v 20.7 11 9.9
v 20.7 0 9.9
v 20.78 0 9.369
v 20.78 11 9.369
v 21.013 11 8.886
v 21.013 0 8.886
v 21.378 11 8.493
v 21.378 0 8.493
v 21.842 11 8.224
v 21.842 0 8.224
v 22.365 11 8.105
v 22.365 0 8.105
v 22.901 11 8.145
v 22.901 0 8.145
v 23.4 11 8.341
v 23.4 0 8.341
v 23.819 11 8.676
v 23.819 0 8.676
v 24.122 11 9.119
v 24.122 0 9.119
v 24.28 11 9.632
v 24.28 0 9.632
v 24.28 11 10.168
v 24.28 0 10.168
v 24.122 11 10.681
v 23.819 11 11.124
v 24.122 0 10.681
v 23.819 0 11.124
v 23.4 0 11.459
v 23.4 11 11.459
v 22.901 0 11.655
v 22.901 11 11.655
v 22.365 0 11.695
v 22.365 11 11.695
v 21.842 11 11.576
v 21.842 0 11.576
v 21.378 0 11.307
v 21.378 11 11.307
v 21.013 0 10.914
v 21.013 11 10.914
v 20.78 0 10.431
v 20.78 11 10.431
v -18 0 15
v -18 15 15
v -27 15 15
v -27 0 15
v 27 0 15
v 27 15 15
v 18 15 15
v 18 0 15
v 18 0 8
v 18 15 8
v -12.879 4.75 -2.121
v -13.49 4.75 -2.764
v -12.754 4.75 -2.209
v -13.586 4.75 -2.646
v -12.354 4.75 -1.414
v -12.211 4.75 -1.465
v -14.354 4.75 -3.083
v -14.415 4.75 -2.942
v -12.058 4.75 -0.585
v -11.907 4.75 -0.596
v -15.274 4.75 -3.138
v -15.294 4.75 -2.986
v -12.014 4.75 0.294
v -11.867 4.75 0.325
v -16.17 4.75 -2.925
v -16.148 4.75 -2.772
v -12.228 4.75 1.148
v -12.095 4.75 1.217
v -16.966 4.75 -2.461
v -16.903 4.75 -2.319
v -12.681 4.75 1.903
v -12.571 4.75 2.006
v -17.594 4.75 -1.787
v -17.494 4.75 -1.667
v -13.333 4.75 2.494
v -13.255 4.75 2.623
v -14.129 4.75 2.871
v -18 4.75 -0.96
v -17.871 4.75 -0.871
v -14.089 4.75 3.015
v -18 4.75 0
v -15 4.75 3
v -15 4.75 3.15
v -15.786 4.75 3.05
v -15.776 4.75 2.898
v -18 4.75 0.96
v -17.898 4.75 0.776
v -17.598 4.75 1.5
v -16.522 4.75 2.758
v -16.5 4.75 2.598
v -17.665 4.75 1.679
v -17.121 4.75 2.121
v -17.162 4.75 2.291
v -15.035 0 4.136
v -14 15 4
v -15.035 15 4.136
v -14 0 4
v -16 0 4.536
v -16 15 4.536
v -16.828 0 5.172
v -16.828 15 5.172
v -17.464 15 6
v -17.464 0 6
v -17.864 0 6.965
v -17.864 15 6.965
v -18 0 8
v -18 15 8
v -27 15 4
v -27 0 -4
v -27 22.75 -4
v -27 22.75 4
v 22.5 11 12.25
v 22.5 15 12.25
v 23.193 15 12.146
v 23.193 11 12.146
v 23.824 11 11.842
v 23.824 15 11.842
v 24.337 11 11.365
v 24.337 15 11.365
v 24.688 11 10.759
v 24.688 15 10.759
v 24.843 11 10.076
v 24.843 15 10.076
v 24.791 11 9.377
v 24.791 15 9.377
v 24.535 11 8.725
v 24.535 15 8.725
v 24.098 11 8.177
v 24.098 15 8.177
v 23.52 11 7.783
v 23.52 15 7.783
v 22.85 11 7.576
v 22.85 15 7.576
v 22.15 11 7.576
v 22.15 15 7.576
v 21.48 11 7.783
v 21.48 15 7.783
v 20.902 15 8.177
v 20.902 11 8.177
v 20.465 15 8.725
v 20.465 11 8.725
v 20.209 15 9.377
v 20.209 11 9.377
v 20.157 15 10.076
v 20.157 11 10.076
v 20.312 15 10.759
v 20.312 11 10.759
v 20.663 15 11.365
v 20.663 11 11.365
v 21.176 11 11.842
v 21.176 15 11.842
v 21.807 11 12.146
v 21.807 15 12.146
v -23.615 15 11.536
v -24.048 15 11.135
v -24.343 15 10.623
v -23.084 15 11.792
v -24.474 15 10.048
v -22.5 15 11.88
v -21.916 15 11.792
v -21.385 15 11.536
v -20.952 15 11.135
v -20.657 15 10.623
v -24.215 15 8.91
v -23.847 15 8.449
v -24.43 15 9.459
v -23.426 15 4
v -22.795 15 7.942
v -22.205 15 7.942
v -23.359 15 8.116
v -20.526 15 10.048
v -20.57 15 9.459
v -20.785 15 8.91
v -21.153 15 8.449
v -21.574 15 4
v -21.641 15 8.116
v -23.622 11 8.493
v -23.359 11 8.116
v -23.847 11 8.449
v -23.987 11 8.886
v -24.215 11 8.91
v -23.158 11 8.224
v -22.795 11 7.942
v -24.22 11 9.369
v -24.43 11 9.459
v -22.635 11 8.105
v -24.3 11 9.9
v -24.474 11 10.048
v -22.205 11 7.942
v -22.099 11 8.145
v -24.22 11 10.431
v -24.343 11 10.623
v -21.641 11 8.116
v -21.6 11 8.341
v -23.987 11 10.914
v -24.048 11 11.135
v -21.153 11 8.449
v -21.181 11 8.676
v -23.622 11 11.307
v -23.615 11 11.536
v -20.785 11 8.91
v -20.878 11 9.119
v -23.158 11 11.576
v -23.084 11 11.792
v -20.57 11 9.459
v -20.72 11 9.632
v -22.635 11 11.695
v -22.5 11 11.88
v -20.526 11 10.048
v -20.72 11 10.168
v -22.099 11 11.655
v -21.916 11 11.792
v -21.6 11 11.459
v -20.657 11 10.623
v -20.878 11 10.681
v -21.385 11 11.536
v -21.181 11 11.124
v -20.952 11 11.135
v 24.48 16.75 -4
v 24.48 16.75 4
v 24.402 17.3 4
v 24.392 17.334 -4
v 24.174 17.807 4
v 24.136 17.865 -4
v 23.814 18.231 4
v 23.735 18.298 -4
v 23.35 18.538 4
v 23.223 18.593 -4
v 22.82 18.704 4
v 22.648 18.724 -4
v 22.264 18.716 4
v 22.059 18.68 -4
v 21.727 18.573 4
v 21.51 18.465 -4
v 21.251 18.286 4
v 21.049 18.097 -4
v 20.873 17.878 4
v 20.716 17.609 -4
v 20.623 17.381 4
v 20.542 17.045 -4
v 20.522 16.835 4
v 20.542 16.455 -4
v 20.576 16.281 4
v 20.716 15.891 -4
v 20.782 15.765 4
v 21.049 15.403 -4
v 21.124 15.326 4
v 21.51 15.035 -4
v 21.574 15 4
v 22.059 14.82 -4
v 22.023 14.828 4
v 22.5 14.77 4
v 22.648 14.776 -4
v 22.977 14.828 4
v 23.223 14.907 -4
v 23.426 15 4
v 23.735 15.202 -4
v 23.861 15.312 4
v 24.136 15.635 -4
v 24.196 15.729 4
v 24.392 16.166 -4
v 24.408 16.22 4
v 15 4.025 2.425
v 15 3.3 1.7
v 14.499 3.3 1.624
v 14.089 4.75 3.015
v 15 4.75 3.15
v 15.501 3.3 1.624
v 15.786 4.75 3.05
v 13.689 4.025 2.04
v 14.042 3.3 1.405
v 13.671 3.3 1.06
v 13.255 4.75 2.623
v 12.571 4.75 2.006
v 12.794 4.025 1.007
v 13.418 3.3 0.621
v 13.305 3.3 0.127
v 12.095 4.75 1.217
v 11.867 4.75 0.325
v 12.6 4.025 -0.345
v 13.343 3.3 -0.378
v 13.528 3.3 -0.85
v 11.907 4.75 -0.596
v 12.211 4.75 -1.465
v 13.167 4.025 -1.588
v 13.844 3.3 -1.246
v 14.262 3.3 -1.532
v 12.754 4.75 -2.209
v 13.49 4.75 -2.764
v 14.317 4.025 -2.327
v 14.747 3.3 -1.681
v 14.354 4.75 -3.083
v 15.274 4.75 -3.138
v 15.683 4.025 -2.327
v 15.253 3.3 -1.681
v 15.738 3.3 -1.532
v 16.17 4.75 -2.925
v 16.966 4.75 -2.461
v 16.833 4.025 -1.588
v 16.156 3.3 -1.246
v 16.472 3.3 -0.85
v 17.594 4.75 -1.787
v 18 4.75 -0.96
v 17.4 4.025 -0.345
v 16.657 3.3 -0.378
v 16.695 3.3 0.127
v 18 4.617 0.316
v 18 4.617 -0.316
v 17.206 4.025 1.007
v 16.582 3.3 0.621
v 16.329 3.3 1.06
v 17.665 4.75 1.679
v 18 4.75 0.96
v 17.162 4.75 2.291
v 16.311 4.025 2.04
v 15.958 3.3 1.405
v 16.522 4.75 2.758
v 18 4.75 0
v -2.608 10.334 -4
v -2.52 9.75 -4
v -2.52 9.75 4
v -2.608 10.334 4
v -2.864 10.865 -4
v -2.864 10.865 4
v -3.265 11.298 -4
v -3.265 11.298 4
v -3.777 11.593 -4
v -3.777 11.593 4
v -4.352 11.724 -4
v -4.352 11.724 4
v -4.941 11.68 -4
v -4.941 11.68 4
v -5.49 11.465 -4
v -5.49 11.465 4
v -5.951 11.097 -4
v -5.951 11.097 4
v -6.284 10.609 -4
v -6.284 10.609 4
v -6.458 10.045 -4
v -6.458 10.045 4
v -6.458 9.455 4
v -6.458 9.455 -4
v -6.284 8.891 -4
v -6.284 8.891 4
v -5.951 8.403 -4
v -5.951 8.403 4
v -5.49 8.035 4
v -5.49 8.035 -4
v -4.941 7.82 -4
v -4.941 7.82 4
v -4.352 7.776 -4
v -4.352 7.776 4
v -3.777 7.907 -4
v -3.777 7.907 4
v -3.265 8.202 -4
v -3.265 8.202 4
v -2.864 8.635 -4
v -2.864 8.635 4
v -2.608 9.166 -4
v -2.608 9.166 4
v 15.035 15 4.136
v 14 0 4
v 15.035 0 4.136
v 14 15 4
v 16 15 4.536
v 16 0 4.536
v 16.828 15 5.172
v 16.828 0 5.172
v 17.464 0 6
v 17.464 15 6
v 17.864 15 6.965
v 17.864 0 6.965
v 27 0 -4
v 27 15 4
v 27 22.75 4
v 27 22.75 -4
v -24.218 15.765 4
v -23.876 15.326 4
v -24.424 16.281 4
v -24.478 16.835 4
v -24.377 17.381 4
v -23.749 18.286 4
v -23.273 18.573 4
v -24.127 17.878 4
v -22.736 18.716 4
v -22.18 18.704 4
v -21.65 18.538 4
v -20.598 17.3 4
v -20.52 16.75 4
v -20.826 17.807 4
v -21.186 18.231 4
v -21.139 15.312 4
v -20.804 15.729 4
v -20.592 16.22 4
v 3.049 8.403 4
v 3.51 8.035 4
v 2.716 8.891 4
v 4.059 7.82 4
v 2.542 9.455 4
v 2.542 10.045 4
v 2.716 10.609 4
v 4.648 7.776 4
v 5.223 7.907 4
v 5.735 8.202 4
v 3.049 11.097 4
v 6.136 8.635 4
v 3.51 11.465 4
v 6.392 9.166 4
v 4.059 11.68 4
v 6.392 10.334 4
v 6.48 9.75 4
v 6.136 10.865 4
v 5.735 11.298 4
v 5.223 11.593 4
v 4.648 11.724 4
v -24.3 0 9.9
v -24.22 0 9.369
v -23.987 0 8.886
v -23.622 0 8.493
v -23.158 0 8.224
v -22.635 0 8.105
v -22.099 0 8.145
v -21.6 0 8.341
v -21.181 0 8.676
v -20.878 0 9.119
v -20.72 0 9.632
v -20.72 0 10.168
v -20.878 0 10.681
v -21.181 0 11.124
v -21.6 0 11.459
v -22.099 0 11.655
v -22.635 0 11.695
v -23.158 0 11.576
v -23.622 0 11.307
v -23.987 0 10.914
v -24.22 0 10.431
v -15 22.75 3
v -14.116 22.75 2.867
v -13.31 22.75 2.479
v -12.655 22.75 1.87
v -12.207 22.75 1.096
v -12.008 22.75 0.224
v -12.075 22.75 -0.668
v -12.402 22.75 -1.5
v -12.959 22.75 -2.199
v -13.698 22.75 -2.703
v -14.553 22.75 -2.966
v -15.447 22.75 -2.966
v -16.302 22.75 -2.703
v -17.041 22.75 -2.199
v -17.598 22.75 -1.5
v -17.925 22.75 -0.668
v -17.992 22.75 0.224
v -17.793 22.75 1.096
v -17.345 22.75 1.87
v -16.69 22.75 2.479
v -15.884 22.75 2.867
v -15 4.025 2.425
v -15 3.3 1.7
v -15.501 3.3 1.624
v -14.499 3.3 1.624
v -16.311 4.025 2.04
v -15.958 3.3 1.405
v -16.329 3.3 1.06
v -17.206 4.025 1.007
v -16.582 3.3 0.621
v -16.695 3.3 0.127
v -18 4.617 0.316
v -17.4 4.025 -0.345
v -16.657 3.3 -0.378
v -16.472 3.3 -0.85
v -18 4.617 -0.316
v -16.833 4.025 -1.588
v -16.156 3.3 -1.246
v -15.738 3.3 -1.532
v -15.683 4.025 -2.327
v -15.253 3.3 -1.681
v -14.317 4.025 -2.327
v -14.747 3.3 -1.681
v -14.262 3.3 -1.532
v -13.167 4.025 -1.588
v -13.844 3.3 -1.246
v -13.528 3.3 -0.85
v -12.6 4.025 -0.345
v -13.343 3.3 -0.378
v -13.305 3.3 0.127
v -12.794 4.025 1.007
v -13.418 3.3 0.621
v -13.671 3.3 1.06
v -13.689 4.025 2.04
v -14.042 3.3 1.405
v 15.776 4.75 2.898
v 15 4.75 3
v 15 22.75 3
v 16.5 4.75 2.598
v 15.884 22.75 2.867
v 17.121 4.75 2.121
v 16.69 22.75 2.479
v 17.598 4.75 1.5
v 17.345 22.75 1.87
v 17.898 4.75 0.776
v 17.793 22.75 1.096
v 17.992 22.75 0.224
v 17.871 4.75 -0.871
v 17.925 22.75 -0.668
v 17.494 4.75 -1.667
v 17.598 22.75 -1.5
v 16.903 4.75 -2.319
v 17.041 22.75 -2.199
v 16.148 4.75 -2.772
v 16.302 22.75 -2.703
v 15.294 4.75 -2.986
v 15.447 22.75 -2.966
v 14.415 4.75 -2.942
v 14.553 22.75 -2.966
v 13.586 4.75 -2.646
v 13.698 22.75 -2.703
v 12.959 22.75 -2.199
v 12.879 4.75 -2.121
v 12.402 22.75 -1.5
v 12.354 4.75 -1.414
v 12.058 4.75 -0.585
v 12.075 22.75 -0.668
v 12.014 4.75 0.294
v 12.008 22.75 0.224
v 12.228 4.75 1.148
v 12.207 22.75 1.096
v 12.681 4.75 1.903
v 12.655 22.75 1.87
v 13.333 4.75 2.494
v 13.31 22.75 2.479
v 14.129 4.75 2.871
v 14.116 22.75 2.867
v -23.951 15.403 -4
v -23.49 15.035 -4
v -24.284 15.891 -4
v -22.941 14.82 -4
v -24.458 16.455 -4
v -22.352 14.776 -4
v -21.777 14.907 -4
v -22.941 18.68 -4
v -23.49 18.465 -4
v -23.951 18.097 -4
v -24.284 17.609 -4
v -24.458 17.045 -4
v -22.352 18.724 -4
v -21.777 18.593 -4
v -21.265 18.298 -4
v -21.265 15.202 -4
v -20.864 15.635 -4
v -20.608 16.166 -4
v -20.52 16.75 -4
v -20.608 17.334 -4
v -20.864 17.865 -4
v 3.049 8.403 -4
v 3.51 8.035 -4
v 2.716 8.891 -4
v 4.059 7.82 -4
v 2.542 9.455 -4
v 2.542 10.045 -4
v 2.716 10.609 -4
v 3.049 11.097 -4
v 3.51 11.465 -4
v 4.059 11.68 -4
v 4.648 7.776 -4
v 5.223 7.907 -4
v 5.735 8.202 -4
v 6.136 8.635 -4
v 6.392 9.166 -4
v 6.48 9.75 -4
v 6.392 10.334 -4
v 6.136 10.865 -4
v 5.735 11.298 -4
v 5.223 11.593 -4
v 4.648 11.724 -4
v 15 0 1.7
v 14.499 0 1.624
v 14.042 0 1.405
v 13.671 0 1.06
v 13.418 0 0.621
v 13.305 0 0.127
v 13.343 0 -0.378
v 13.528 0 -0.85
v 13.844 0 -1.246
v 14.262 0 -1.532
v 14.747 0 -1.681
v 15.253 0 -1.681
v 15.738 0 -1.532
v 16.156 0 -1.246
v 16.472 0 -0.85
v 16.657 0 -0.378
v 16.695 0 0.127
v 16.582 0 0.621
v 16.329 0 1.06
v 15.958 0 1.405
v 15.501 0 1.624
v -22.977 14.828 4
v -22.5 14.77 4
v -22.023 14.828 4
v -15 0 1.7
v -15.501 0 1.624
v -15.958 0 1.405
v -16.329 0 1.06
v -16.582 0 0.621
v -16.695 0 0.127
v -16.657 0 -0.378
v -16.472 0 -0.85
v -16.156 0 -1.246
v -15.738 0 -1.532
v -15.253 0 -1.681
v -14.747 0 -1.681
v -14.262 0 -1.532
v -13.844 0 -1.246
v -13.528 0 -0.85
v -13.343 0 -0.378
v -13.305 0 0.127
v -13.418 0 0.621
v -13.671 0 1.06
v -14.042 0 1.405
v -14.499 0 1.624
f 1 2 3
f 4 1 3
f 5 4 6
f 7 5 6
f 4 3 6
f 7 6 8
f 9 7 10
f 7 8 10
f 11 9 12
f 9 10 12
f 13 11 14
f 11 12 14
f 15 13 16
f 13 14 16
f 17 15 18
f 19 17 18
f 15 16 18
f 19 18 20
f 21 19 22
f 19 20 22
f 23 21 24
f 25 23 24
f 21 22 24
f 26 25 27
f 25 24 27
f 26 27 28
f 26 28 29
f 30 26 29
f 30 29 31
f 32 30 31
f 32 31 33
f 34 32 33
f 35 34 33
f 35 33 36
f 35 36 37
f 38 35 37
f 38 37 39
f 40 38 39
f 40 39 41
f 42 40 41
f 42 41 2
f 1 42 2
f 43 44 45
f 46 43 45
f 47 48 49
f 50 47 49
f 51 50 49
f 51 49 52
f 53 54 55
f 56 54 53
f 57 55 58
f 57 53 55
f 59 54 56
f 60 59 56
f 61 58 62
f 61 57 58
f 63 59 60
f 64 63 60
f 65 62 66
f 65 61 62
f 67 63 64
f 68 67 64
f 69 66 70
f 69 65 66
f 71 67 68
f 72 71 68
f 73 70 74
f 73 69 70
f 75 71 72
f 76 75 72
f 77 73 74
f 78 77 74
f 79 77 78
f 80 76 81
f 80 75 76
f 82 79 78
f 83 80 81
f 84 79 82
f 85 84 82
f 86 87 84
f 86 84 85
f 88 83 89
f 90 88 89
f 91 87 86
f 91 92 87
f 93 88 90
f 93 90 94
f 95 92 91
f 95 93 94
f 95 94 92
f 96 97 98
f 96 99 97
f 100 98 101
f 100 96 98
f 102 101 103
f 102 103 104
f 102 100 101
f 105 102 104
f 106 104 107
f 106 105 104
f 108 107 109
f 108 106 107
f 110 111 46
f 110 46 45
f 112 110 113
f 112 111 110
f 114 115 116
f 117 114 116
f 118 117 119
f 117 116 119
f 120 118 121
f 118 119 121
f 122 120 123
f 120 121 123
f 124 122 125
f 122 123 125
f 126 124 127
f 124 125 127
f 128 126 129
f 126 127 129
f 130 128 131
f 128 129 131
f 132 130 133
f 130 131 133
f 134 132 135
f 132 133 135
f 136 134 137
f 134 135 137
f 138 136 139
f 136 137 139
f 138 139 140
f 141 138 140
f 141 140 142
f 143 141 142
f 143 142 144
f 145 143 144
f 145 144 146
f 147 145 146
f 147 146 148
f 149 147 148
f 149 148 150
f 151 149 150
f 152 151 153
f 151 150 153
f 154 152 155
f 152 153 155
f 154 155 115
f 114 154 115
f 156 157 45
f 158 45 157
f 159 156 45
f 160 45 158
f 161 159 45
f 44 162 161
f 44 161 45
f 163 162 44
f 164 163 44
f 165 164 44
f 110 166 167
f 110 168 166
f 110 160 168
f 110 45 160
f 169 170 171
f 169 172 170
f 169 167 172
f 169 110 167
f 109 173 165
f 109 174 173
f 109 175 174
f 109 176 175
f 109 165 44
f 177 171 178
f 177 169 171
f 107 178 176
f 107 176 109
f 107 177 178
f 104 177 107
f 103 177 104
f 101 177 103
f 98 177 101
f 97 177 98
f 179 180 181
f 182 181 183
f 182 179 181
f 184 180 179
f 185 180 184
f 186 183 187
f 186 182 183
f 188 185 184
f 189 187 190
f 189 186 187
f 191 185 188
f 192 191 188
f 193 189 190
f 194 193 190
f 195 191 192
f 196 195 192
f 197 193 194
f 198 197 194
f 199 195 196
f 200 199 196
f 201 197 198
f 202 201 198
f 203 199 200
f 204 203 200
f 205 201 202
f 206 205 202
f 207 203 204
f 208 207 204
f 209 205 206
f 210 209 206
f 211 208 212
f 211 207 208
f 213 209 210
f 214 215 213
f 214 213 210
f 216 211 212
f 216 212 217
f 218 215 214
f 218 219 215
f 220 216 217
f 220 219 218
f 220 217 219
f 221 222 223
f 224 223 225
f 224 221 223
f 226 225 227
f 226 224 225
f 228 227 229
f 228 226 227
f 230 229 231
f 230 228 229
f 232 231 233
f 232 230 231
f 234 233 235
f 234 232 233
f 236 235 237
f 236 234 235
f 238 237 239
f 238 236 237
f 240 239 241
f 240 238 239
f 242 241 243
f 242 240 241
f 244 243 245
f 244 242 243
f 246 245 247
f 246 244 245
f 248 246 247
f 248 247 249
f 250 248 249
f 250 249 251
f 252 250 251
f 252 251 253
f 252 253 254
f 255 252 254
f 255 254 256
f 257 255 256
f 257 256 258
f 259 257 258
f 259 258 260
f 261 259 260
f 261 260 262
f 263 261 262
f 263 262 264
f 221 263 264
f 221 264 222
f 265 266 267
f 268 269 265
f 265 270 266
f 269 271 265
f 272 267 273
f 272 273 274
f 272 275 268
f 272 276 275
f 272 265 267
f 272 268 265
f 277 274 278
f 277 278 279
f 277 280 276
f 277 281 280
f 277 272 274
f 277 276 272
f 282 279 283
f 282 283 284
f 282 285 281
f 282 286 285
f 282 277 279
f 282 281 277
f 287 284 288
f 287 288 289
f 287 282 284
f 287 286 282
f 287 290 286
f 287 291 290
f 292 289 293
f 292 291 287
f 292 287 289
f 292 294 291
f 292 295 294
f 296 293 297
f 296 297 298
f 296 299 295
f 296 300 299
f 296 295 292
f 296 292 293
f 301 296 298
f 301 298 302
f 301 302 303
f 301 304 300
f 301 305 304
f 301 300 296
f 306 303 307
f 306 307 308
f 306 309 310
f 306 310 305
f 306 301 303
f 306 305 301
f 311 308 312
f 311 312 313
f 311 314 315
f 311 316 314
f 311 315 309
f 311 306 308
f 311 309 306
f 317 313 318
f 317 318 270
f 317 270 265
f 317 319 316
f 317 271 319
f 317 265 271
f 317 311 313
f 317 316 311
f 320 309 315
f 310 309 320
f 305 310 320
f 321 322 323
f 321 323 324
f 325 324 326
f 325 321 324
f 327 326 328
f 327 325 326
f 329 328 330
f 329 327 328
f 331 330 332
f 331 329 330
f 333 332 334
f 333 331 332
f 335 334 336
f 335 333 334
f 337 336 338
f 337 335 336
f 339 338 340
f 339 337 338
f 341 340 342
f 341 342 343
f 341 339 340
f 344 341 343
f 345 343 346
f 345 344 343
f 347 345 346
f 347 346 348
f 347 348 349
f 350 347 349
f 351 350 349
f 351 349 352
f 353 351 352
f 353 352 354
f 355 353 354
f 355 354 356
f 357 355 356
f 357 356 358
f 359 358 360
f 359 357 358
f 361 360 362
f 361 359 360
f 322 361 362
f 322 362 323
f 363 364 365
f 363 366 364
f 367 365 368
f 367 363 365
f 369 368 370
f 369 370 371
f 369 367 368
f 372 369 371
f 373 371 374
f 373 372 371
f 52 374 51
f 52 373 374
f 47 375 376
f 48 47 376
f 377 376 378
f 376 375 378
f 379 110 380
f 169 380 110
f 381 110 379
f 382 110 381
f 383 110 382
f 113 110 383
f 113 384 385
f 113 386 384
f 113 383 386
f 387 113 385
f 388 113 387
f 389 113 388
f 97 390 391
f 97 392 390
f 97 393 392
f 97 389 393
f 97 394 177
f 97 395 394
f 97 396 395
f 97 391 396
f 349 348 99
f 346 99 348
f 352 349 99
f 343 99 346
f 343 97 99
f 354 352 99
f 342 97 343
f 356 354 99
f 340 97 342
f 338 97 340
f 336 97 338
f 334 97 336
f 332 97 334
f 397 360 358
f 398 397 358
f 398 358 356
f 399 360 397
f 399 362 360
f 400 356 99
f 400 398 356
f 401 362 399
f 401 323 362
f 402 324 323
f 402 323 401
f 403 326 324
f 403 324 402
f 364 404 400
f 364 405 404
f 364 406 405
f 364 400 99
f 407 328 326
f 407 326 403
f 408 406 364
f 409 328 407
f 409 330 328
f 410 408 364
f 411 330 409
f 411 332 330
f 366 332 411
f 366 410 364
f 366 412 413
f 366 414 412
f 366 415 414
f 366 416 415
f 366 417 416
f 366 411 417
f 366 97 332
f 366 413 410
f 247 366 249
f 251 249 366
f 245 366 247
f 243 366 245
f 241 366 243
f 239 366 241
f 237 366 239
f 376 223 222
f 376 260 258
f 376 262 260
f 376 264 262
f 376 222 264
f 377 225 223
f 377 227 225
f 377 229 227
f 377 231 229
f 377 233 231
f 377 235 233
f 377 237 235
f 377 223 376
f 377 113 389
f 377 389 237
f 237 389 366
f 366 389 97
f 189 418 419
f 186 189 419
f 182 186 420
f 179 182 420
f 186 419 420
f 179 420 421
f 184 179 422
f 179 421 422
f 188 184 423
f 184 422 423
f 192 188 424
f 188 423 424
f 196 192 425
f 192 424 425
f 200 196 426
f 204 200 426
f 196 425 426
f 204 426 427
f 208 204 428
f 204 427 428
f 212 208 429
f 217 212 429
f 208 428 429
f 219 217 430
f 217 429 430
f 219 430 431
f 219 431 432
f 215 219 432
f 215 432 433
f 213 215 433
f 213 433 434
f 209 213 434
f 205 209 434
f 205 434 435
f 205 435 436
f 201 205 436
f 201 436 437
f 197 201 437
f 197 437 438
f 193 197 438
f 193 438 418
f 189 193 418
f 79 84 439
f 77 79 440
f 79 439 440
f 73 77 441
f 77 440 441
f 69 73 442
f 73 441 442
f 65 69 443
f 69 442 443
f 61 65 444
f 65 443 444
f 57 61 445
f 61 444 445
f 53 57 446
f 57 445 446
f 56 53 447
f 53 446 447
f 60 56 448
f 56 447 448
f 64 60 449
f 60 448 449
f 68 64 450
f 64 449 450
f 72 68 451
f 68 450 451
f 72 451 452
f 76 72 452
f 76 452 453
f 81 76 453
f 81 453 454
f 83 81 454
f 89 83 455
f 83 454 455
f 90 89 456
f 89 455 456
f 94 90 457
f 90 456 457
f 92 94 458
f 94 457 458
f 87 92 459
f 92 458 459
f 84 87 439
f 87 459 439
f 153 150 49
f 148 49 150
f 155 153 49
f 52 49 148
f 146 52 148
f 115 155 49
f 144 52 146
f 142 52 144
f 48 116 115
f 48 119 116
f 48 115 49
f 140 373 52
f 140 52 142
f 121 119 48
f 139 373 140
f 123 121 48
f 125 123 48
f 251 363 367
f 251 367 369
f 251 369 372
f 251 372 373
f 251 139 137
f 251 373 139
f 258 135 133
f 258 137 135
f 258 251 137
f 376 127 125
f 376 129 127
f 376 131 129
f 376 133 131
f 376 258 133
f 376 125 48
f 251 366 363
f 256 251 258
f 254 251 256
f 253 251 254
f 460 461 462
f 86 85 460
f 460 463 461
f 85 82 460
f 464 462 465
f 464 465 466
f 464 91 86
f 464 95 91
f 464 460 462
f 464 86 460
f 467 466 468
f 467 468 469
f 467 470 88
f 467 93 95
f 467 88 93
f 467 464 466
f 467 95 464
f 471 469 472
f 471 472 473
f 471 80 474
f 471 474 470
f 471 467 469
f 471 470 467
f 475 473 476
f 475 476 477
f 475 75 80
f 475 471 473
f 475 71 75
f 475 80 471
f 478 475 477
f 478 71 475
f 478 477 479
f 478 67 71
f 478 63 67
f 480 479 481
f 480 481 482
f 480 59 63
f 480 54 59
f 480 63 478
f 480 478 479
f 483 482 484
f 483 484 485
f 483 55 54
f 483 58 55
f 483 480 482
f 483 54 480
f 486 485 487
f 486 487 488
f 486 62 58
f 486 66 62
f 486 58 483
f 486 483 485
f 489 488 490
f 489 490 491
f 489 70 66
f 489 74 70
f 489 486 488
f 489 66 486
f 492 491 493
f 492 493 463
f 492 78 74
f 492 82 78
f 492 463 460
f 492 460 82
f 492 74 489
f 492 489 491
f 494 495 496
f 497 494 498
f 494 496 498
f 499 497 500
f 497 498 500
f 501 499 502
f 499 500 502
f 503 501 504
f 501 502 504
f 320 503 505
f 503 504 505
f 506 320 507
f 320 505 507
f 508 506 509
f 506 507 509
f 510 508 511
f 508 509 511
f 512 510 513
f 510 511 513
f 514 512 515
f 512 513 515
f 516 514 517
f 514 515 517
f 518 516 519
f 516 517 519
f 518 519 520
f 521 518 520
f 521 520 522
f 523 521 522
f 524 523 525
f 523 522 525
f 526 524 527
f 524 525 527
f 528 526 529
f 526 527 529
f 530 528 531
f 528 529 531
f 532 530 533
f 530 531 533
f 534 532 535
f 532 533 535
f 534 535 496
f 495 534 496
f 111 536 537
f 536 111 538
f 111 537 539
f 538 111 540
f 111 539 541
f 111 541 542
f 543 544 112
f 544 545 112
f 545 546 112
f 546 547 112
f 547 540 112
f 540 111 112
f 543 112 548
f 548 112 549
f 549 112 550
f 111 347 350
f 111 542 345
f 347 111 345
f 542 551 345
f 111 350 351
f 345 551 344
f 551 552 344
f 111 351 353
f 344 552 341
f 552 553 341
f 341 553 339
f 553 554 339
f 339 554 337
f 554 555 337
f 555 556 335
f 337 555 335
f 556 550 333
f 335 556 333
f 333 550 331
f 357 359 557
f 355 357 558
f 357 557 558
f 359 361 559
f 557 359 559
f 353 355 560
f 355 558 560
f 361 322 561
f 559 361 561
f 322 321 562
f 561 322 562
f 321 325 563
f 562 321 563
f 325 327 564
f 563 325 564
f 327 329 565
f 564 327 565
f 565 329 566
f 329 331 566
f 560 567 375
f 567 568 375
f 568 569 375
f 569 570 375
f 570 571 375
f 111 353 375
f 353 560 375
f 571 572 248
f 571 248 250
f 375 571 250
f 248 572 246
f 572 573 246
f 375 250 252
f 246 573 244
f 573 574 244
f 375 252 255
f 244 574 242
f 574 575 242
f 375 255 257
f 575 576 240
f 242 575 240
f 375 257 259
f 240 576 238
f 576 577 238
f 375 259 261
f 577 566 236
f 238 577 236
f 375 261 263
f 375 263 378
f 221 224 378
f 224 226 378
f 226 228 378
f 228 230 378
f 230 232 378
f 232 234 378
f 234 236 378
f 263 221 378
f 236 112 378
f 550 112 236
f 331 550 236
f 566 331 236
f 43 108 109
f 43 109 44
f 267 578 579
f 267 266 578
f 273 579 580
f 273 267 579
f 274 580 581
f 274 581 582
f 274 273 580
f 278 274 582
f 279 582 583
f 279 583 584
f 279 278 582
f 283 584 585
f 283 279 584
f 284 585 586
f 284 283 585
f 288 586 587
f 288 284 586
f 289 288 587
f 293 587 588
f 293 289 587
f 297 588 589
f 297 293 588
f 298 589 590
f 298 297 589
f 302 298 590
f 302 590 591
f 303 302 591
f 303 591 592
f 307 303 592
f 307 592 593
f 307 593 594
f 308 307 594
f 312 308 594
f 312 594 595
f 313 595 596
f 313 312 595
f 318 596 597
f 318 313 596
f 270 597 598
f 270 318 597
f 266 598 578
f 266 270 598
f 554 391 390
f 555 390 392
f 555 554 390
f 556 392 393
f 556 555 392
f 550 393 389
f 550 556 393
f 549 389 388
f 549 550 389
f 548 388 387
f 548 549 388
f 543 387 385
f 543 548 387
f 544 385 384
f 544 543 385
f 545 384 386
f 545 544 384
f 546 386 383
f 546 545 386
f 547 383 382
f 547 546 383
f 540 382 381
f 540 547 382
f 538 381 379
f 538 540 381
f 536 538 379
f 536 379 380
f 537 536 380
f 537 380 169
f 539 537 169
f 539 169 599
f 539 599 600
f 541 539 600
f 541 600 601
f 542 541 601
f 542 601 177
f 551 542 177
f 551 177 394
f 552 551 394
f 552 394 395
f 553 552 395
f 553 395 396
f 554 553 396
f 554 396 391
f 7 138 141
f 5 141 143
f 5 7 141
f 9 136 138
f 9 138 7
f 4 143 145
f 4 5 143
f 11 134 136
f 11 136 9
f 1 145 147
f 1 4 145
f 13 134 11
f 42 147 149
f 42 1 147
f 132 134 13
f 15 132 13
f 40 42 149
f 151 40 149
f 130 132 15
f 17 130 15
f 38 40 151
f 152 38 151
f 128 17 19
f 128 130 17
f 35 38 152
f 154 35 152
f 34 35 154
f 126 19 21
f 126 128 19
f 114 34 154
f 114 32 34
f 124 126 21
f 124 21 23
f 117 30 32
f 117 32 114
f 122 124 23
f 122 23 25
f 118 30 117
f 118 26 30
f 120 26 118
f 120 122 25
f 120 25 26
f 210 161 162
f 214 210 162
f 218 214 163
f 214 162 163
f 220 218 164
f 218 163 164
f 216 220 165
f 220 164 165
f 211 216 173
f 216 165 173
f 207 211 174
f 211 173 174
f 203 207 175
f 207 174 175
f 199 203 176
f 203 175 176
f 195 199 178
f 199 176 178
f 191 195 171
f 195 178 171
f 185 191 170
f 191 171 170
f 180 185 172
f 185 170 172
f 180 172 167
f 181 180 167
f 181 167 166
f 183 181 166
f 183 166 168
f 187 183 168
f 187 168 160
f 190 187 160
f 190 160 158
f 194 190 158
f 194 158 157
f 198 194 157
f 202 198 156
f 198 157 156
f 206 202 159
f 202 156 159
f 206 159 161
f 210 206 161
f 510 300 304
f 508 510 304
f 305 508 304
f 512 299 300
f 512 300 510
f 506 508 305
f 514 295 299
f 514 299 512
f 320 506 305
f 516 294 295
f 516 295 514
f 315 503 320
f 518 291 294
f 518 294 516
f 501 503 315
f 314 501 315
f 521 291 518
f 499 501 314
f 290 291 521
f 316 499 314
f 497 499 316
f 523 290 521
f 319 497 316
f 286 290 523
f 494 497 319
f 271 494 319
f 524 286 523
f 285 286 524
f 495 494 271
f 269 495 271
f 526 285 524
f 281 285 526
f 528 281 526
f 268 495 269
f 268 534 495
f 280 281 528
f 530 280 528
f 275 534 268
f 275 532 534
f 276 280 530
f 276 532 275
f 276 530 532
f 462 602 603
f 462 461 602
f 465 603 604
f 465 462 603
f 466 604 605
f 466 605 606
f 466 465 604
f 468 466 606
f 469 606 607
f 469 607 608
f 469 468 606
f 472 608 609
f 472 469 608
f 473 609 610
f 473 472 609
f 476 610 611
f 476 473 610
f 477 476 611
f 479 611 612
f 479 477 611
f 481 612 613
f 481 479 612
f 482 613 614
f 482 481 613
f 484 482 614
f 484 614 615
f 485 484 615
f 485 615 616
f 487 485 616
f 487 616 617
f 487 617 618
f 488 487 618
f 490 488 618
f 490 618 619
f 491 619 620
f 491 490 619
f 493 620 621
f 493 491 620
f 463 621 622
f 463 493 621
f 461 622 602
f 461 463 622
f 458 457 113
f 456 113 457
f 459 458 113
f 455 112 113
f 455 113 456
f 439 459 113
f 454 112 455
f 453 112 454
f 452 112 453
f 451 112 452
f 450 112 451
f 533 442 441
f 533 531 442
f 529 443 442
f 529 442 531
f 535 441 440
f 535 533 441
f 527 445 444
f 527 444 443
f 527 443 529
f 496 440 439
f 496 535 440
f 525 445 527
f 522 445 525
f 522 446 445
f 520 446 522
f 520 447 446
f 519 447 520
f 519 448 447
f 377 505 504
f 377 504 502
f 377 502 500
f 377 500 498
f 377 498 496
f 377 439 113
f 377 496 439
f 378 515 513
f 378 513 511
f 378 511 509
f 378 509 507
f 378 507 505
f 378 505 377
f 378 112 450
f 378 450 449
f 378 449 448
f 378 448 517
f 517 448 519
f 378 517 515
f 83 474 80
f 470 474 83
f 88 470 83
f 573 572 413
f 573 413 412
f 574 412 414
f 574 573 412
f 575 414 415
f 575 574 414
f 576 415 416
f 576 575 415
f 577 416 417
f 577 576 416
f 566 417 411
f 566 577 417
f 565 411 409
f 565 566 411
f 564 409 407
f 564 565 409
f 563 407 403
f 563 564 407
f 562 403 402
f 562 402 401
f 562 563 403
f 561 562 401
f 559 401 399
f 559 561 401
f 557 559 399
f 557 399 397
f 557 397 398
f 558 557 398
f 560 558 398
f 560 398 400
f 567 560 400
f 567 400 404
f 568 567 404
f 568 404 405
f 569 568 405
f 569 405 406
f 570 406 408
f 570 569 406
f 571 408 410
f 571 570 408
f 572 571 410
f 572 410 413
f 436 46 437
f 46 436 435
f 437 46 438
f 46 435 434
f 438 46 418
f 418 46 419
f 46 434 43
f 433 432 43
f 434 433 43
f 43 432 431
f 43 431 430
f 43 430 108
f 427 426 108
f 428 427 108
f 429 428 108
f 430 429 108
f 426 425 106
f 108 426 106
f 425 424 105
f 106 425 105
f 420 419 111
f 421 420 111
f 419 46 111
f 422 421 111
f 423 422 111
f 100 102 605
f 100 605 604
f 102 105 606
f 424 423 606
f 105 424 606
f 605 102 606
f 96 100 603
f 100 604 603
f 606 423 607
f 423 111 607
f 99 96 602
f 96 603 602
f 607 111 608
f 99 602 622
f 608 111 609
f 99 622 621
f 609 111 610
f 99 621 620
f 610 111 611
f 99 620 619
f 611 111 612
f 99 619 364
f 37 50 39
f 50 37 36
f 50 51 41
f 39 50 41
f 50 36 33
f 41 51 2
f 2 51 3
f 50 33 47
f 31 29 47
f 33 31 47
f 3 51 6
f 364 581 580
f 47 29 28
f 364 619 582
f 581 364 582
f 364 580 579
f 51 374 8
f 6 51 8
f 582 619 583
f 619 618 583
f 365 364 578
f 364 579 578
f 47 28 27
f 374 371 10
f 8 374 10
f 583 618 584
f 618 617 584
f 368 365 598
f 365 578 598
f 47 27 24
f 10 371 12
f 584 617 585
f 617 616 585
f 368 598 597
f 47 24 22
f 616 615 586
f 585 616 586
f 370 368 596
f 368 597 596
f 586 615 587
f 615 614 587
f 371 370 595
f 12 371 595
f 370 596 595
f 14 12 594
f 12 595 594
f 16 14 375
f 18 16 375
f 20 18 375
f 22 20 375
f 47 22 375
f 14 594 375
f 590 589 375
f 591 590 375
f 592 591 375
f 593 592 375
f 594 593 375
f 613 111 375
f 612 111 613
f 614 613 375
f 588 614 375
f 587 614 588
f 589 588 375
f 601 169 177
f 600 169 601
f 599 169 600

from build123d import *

# Parameters (mm, degrees)
SKETCH1_W                                    = 38
SKETCH1_H                                    = 8
BOSS_EXTRUDE1_DEPTH                          = 22.75
SKETCH9_W                                    = 9
SKETCH9_H                                    = 5
BOSS_EXTRUDE2_DEPTH                          = 19
SKETCH8_R                                    = 3
CUT_EXTRUDE1_DEPTH                           = 18
CSK_FOR_M3_COUNTERSUNK_FLAT_HEAD_SCR_2_COUNT = 2
CSK_FOR_M3_COUNTERSUNK_FLAT_HEAD_SCR_2_PITCH = 30
FILLET1_R                                    = 2
BOSS_EXTRUDE3_DEPTH                          = 22.75
SKETCH16_R                                   = 1.98
CUT_EXTRUDE4_DEPTH                           = 8
SKETCH14_W                                   = 54
SKETCH14_H                                   = 11
CUT_EXTRUDE6_DEPTH                           = 7.75
SKETCH15_R                                   = 1.98
SKETCH15_R_2                                 = 2.35
CUT_EXTRUDE7_DEPTH                           = 4
M3_CLEARANCE_HOLE2_D                         = 3.6
FILLET2_R                                    = 4


with BuildPart() as part:
    # Sketch1 → Boss-Extrude1 (new body)
    with BuildSketch(Plane(origin=(0, 0, 0), x_dir=(1, 0, 0), z_dir=(0, 1, 0))):
        Rectangle(SKETCH1_W, SKETCH1_H)
    extrude(amount=BOSS_EXTRUDE1_DEPTH)

    # Sketch9 → Boss-Extrude2 (add)
    with BuildSketch(Plane.XY.offset(-4)):
        with Locations((-22.5, 12.5)):
            Rectangle(SKETCH9_W, SKETCH9_H)
        with Locations((22.5, 12.5)):
            Rectangle(SKETCH9_W, SKETCH9_H)
    extrude(amount=BOSS_EXTRUDE2_DEPTH)

    # Sketch8 → Cut-Extrude1 (cut)
    with BuildSketch(Plane(origin=(0, 22.75, 0), x_dir=(1, 0, 0), z_dir=(0, 1, 0))):
        with Locations(Location((-15, 0, 0), (0, 0, 270))):
            Circle(SKETCH8_R)
        with Locations(Location((15, 0, 0), (0, 0, 270))):
            Circle(SKETCH8_R)
    extrude(amount=-CUT_EXTRUDE1_DEPTH, mode=Mode.SUBTRACT)

    # Sketch4 → CSK for M3 Countersunk Flat Head Screw1 (revolve, cut)
    with BuildSketch(Plane(origin=(-15, 4.75, 0), x_dir=(0, 0, 1), z_dir=(1, 0, 0))):
        Polygon((0, 0), (0, 4.75), (1.7, 4.75), (1.7, 1.45), (3.15, 0), align=None)
    csk_for_m3_countersunk_flat_head_screw1 = revolve(axis=Axis((-15, 11.1, 0), (0, -1, 0)), mode=Mode.SUBTRACT)

    # CSK for M3 Countersunk Flat Head Scr 2: CSK for M3 Countersunk Flat Head Screw1 ×2
    with Locations(*[(i * CSK_FOR_M3_COUNTERSUNK_FLAT_HEAD_SCR_2_PITCH, 0, 0) for i in range(1, CSK_FOR_M3_COUNTERSUNK_FLAT_HEAD_SCR_2_COUNT)]):
        add(csk_for_m3_countersunk_flat_head_screw1, mode=Mode.SUBTRACT)

    # Fillet1
    fillet1_edges = [part.edges().sort_by_distance(p)[0] for p in [
        (-27, 12.5, 15),
        (-18, 12.5, 15),
        (27, 12.5, 15),
        (18, 12.5, 15),
    ]]
    fillet(fillet1_edges, radius=FILLET1_R)

    # Sketch13 → Boss-Extrude3 (add)
    with BuildSketch(Plane(origin=(0, 0, 0), x_dir=(-1, 0, 0), z_dir=(0, -1, 0))):
        Polygon((-18, -4), (-18, 4), (-27, 4), (-27, -4), (-27, -15), (-18, -15), align=None)
        Polygon((27, 4), (18, 4), (18, -4), (18, -15), (27, -15), (27, -4), align=None)
    extrude(amount=-BOSS_EXTRUDE3_DEPTH)

    # Sketch16 → Cut-Extrude4 (cut)
    with BuildSketch(Plane.XY.offset(-4)):
        with Locations((-22.5, 16.75)):
            Circle(SKETCH16_R)
        with Locations((-4.5, 9.75)):
            Circle(SKETCH16_R)
        with Locations((4.5, 9.75)):
            Circle(SKETCH16_R)
        with Locations((22.5, 16.75)):
            Circle(SKETCH16_R)
    extrude(amount=CUT_EXTRUDE4_DEPTH, mode=Mode.SUBTRACT)

    # Sketch14 → Cut-Extrude6 (cut)
    with BuildSketch(Plane(origin=(0, 22.75, 0), x_dir=(1, 0, 0), z_dir=(0, 1, 0))):
        with Locations((0, -9.5)):
            Rectangle(SKETCH14_W, SKETCH14_H)
    extrude(amount=-CUT_EXTRUDE6_DEPTH, mode=Mode.SUBTRACT)

    # Sketch15 → Cut-Extrude7 (cut)
    with BuildSketch(Plane(origin=(0, 15, 0), x_dir=(1, 0, 0), z_dir=(0, 1, 0))):
        with Locations(Location((-22.5, -9.9, 0), (0, 0, 270))):
            Circle(SKETCH15_R)
        with Locations(Location((22.5, -9.9, 0), (0, 0, 270))):
            Circle(SKETCH15_R_2)
    extrude(amount=-CUT_EXTRUDE7_DEPTH, mode=Mode.SUBTRACT)

    # M3 Clearance Hole2 (through all)
    with Locations(Plane(origin=(0, 11, 0), x_dir=(1, 0, 0), z_dir=(0, 1, 0))):
        with Locations((-22.5, -9.9), (22.5, -9.9)):
            Hole(M3_CLEARANCE_HOLE2_D / 2)

    # Fillet2
    fillet2_edges = [part.edges().sort_by_distance(p)[0] for p in [
        (-18, 7.5, 4),
        (18, 7.5, 4),
    ]]
    fillet(fillet2_edges, radius=FILLET2_R)


solid = part.part
